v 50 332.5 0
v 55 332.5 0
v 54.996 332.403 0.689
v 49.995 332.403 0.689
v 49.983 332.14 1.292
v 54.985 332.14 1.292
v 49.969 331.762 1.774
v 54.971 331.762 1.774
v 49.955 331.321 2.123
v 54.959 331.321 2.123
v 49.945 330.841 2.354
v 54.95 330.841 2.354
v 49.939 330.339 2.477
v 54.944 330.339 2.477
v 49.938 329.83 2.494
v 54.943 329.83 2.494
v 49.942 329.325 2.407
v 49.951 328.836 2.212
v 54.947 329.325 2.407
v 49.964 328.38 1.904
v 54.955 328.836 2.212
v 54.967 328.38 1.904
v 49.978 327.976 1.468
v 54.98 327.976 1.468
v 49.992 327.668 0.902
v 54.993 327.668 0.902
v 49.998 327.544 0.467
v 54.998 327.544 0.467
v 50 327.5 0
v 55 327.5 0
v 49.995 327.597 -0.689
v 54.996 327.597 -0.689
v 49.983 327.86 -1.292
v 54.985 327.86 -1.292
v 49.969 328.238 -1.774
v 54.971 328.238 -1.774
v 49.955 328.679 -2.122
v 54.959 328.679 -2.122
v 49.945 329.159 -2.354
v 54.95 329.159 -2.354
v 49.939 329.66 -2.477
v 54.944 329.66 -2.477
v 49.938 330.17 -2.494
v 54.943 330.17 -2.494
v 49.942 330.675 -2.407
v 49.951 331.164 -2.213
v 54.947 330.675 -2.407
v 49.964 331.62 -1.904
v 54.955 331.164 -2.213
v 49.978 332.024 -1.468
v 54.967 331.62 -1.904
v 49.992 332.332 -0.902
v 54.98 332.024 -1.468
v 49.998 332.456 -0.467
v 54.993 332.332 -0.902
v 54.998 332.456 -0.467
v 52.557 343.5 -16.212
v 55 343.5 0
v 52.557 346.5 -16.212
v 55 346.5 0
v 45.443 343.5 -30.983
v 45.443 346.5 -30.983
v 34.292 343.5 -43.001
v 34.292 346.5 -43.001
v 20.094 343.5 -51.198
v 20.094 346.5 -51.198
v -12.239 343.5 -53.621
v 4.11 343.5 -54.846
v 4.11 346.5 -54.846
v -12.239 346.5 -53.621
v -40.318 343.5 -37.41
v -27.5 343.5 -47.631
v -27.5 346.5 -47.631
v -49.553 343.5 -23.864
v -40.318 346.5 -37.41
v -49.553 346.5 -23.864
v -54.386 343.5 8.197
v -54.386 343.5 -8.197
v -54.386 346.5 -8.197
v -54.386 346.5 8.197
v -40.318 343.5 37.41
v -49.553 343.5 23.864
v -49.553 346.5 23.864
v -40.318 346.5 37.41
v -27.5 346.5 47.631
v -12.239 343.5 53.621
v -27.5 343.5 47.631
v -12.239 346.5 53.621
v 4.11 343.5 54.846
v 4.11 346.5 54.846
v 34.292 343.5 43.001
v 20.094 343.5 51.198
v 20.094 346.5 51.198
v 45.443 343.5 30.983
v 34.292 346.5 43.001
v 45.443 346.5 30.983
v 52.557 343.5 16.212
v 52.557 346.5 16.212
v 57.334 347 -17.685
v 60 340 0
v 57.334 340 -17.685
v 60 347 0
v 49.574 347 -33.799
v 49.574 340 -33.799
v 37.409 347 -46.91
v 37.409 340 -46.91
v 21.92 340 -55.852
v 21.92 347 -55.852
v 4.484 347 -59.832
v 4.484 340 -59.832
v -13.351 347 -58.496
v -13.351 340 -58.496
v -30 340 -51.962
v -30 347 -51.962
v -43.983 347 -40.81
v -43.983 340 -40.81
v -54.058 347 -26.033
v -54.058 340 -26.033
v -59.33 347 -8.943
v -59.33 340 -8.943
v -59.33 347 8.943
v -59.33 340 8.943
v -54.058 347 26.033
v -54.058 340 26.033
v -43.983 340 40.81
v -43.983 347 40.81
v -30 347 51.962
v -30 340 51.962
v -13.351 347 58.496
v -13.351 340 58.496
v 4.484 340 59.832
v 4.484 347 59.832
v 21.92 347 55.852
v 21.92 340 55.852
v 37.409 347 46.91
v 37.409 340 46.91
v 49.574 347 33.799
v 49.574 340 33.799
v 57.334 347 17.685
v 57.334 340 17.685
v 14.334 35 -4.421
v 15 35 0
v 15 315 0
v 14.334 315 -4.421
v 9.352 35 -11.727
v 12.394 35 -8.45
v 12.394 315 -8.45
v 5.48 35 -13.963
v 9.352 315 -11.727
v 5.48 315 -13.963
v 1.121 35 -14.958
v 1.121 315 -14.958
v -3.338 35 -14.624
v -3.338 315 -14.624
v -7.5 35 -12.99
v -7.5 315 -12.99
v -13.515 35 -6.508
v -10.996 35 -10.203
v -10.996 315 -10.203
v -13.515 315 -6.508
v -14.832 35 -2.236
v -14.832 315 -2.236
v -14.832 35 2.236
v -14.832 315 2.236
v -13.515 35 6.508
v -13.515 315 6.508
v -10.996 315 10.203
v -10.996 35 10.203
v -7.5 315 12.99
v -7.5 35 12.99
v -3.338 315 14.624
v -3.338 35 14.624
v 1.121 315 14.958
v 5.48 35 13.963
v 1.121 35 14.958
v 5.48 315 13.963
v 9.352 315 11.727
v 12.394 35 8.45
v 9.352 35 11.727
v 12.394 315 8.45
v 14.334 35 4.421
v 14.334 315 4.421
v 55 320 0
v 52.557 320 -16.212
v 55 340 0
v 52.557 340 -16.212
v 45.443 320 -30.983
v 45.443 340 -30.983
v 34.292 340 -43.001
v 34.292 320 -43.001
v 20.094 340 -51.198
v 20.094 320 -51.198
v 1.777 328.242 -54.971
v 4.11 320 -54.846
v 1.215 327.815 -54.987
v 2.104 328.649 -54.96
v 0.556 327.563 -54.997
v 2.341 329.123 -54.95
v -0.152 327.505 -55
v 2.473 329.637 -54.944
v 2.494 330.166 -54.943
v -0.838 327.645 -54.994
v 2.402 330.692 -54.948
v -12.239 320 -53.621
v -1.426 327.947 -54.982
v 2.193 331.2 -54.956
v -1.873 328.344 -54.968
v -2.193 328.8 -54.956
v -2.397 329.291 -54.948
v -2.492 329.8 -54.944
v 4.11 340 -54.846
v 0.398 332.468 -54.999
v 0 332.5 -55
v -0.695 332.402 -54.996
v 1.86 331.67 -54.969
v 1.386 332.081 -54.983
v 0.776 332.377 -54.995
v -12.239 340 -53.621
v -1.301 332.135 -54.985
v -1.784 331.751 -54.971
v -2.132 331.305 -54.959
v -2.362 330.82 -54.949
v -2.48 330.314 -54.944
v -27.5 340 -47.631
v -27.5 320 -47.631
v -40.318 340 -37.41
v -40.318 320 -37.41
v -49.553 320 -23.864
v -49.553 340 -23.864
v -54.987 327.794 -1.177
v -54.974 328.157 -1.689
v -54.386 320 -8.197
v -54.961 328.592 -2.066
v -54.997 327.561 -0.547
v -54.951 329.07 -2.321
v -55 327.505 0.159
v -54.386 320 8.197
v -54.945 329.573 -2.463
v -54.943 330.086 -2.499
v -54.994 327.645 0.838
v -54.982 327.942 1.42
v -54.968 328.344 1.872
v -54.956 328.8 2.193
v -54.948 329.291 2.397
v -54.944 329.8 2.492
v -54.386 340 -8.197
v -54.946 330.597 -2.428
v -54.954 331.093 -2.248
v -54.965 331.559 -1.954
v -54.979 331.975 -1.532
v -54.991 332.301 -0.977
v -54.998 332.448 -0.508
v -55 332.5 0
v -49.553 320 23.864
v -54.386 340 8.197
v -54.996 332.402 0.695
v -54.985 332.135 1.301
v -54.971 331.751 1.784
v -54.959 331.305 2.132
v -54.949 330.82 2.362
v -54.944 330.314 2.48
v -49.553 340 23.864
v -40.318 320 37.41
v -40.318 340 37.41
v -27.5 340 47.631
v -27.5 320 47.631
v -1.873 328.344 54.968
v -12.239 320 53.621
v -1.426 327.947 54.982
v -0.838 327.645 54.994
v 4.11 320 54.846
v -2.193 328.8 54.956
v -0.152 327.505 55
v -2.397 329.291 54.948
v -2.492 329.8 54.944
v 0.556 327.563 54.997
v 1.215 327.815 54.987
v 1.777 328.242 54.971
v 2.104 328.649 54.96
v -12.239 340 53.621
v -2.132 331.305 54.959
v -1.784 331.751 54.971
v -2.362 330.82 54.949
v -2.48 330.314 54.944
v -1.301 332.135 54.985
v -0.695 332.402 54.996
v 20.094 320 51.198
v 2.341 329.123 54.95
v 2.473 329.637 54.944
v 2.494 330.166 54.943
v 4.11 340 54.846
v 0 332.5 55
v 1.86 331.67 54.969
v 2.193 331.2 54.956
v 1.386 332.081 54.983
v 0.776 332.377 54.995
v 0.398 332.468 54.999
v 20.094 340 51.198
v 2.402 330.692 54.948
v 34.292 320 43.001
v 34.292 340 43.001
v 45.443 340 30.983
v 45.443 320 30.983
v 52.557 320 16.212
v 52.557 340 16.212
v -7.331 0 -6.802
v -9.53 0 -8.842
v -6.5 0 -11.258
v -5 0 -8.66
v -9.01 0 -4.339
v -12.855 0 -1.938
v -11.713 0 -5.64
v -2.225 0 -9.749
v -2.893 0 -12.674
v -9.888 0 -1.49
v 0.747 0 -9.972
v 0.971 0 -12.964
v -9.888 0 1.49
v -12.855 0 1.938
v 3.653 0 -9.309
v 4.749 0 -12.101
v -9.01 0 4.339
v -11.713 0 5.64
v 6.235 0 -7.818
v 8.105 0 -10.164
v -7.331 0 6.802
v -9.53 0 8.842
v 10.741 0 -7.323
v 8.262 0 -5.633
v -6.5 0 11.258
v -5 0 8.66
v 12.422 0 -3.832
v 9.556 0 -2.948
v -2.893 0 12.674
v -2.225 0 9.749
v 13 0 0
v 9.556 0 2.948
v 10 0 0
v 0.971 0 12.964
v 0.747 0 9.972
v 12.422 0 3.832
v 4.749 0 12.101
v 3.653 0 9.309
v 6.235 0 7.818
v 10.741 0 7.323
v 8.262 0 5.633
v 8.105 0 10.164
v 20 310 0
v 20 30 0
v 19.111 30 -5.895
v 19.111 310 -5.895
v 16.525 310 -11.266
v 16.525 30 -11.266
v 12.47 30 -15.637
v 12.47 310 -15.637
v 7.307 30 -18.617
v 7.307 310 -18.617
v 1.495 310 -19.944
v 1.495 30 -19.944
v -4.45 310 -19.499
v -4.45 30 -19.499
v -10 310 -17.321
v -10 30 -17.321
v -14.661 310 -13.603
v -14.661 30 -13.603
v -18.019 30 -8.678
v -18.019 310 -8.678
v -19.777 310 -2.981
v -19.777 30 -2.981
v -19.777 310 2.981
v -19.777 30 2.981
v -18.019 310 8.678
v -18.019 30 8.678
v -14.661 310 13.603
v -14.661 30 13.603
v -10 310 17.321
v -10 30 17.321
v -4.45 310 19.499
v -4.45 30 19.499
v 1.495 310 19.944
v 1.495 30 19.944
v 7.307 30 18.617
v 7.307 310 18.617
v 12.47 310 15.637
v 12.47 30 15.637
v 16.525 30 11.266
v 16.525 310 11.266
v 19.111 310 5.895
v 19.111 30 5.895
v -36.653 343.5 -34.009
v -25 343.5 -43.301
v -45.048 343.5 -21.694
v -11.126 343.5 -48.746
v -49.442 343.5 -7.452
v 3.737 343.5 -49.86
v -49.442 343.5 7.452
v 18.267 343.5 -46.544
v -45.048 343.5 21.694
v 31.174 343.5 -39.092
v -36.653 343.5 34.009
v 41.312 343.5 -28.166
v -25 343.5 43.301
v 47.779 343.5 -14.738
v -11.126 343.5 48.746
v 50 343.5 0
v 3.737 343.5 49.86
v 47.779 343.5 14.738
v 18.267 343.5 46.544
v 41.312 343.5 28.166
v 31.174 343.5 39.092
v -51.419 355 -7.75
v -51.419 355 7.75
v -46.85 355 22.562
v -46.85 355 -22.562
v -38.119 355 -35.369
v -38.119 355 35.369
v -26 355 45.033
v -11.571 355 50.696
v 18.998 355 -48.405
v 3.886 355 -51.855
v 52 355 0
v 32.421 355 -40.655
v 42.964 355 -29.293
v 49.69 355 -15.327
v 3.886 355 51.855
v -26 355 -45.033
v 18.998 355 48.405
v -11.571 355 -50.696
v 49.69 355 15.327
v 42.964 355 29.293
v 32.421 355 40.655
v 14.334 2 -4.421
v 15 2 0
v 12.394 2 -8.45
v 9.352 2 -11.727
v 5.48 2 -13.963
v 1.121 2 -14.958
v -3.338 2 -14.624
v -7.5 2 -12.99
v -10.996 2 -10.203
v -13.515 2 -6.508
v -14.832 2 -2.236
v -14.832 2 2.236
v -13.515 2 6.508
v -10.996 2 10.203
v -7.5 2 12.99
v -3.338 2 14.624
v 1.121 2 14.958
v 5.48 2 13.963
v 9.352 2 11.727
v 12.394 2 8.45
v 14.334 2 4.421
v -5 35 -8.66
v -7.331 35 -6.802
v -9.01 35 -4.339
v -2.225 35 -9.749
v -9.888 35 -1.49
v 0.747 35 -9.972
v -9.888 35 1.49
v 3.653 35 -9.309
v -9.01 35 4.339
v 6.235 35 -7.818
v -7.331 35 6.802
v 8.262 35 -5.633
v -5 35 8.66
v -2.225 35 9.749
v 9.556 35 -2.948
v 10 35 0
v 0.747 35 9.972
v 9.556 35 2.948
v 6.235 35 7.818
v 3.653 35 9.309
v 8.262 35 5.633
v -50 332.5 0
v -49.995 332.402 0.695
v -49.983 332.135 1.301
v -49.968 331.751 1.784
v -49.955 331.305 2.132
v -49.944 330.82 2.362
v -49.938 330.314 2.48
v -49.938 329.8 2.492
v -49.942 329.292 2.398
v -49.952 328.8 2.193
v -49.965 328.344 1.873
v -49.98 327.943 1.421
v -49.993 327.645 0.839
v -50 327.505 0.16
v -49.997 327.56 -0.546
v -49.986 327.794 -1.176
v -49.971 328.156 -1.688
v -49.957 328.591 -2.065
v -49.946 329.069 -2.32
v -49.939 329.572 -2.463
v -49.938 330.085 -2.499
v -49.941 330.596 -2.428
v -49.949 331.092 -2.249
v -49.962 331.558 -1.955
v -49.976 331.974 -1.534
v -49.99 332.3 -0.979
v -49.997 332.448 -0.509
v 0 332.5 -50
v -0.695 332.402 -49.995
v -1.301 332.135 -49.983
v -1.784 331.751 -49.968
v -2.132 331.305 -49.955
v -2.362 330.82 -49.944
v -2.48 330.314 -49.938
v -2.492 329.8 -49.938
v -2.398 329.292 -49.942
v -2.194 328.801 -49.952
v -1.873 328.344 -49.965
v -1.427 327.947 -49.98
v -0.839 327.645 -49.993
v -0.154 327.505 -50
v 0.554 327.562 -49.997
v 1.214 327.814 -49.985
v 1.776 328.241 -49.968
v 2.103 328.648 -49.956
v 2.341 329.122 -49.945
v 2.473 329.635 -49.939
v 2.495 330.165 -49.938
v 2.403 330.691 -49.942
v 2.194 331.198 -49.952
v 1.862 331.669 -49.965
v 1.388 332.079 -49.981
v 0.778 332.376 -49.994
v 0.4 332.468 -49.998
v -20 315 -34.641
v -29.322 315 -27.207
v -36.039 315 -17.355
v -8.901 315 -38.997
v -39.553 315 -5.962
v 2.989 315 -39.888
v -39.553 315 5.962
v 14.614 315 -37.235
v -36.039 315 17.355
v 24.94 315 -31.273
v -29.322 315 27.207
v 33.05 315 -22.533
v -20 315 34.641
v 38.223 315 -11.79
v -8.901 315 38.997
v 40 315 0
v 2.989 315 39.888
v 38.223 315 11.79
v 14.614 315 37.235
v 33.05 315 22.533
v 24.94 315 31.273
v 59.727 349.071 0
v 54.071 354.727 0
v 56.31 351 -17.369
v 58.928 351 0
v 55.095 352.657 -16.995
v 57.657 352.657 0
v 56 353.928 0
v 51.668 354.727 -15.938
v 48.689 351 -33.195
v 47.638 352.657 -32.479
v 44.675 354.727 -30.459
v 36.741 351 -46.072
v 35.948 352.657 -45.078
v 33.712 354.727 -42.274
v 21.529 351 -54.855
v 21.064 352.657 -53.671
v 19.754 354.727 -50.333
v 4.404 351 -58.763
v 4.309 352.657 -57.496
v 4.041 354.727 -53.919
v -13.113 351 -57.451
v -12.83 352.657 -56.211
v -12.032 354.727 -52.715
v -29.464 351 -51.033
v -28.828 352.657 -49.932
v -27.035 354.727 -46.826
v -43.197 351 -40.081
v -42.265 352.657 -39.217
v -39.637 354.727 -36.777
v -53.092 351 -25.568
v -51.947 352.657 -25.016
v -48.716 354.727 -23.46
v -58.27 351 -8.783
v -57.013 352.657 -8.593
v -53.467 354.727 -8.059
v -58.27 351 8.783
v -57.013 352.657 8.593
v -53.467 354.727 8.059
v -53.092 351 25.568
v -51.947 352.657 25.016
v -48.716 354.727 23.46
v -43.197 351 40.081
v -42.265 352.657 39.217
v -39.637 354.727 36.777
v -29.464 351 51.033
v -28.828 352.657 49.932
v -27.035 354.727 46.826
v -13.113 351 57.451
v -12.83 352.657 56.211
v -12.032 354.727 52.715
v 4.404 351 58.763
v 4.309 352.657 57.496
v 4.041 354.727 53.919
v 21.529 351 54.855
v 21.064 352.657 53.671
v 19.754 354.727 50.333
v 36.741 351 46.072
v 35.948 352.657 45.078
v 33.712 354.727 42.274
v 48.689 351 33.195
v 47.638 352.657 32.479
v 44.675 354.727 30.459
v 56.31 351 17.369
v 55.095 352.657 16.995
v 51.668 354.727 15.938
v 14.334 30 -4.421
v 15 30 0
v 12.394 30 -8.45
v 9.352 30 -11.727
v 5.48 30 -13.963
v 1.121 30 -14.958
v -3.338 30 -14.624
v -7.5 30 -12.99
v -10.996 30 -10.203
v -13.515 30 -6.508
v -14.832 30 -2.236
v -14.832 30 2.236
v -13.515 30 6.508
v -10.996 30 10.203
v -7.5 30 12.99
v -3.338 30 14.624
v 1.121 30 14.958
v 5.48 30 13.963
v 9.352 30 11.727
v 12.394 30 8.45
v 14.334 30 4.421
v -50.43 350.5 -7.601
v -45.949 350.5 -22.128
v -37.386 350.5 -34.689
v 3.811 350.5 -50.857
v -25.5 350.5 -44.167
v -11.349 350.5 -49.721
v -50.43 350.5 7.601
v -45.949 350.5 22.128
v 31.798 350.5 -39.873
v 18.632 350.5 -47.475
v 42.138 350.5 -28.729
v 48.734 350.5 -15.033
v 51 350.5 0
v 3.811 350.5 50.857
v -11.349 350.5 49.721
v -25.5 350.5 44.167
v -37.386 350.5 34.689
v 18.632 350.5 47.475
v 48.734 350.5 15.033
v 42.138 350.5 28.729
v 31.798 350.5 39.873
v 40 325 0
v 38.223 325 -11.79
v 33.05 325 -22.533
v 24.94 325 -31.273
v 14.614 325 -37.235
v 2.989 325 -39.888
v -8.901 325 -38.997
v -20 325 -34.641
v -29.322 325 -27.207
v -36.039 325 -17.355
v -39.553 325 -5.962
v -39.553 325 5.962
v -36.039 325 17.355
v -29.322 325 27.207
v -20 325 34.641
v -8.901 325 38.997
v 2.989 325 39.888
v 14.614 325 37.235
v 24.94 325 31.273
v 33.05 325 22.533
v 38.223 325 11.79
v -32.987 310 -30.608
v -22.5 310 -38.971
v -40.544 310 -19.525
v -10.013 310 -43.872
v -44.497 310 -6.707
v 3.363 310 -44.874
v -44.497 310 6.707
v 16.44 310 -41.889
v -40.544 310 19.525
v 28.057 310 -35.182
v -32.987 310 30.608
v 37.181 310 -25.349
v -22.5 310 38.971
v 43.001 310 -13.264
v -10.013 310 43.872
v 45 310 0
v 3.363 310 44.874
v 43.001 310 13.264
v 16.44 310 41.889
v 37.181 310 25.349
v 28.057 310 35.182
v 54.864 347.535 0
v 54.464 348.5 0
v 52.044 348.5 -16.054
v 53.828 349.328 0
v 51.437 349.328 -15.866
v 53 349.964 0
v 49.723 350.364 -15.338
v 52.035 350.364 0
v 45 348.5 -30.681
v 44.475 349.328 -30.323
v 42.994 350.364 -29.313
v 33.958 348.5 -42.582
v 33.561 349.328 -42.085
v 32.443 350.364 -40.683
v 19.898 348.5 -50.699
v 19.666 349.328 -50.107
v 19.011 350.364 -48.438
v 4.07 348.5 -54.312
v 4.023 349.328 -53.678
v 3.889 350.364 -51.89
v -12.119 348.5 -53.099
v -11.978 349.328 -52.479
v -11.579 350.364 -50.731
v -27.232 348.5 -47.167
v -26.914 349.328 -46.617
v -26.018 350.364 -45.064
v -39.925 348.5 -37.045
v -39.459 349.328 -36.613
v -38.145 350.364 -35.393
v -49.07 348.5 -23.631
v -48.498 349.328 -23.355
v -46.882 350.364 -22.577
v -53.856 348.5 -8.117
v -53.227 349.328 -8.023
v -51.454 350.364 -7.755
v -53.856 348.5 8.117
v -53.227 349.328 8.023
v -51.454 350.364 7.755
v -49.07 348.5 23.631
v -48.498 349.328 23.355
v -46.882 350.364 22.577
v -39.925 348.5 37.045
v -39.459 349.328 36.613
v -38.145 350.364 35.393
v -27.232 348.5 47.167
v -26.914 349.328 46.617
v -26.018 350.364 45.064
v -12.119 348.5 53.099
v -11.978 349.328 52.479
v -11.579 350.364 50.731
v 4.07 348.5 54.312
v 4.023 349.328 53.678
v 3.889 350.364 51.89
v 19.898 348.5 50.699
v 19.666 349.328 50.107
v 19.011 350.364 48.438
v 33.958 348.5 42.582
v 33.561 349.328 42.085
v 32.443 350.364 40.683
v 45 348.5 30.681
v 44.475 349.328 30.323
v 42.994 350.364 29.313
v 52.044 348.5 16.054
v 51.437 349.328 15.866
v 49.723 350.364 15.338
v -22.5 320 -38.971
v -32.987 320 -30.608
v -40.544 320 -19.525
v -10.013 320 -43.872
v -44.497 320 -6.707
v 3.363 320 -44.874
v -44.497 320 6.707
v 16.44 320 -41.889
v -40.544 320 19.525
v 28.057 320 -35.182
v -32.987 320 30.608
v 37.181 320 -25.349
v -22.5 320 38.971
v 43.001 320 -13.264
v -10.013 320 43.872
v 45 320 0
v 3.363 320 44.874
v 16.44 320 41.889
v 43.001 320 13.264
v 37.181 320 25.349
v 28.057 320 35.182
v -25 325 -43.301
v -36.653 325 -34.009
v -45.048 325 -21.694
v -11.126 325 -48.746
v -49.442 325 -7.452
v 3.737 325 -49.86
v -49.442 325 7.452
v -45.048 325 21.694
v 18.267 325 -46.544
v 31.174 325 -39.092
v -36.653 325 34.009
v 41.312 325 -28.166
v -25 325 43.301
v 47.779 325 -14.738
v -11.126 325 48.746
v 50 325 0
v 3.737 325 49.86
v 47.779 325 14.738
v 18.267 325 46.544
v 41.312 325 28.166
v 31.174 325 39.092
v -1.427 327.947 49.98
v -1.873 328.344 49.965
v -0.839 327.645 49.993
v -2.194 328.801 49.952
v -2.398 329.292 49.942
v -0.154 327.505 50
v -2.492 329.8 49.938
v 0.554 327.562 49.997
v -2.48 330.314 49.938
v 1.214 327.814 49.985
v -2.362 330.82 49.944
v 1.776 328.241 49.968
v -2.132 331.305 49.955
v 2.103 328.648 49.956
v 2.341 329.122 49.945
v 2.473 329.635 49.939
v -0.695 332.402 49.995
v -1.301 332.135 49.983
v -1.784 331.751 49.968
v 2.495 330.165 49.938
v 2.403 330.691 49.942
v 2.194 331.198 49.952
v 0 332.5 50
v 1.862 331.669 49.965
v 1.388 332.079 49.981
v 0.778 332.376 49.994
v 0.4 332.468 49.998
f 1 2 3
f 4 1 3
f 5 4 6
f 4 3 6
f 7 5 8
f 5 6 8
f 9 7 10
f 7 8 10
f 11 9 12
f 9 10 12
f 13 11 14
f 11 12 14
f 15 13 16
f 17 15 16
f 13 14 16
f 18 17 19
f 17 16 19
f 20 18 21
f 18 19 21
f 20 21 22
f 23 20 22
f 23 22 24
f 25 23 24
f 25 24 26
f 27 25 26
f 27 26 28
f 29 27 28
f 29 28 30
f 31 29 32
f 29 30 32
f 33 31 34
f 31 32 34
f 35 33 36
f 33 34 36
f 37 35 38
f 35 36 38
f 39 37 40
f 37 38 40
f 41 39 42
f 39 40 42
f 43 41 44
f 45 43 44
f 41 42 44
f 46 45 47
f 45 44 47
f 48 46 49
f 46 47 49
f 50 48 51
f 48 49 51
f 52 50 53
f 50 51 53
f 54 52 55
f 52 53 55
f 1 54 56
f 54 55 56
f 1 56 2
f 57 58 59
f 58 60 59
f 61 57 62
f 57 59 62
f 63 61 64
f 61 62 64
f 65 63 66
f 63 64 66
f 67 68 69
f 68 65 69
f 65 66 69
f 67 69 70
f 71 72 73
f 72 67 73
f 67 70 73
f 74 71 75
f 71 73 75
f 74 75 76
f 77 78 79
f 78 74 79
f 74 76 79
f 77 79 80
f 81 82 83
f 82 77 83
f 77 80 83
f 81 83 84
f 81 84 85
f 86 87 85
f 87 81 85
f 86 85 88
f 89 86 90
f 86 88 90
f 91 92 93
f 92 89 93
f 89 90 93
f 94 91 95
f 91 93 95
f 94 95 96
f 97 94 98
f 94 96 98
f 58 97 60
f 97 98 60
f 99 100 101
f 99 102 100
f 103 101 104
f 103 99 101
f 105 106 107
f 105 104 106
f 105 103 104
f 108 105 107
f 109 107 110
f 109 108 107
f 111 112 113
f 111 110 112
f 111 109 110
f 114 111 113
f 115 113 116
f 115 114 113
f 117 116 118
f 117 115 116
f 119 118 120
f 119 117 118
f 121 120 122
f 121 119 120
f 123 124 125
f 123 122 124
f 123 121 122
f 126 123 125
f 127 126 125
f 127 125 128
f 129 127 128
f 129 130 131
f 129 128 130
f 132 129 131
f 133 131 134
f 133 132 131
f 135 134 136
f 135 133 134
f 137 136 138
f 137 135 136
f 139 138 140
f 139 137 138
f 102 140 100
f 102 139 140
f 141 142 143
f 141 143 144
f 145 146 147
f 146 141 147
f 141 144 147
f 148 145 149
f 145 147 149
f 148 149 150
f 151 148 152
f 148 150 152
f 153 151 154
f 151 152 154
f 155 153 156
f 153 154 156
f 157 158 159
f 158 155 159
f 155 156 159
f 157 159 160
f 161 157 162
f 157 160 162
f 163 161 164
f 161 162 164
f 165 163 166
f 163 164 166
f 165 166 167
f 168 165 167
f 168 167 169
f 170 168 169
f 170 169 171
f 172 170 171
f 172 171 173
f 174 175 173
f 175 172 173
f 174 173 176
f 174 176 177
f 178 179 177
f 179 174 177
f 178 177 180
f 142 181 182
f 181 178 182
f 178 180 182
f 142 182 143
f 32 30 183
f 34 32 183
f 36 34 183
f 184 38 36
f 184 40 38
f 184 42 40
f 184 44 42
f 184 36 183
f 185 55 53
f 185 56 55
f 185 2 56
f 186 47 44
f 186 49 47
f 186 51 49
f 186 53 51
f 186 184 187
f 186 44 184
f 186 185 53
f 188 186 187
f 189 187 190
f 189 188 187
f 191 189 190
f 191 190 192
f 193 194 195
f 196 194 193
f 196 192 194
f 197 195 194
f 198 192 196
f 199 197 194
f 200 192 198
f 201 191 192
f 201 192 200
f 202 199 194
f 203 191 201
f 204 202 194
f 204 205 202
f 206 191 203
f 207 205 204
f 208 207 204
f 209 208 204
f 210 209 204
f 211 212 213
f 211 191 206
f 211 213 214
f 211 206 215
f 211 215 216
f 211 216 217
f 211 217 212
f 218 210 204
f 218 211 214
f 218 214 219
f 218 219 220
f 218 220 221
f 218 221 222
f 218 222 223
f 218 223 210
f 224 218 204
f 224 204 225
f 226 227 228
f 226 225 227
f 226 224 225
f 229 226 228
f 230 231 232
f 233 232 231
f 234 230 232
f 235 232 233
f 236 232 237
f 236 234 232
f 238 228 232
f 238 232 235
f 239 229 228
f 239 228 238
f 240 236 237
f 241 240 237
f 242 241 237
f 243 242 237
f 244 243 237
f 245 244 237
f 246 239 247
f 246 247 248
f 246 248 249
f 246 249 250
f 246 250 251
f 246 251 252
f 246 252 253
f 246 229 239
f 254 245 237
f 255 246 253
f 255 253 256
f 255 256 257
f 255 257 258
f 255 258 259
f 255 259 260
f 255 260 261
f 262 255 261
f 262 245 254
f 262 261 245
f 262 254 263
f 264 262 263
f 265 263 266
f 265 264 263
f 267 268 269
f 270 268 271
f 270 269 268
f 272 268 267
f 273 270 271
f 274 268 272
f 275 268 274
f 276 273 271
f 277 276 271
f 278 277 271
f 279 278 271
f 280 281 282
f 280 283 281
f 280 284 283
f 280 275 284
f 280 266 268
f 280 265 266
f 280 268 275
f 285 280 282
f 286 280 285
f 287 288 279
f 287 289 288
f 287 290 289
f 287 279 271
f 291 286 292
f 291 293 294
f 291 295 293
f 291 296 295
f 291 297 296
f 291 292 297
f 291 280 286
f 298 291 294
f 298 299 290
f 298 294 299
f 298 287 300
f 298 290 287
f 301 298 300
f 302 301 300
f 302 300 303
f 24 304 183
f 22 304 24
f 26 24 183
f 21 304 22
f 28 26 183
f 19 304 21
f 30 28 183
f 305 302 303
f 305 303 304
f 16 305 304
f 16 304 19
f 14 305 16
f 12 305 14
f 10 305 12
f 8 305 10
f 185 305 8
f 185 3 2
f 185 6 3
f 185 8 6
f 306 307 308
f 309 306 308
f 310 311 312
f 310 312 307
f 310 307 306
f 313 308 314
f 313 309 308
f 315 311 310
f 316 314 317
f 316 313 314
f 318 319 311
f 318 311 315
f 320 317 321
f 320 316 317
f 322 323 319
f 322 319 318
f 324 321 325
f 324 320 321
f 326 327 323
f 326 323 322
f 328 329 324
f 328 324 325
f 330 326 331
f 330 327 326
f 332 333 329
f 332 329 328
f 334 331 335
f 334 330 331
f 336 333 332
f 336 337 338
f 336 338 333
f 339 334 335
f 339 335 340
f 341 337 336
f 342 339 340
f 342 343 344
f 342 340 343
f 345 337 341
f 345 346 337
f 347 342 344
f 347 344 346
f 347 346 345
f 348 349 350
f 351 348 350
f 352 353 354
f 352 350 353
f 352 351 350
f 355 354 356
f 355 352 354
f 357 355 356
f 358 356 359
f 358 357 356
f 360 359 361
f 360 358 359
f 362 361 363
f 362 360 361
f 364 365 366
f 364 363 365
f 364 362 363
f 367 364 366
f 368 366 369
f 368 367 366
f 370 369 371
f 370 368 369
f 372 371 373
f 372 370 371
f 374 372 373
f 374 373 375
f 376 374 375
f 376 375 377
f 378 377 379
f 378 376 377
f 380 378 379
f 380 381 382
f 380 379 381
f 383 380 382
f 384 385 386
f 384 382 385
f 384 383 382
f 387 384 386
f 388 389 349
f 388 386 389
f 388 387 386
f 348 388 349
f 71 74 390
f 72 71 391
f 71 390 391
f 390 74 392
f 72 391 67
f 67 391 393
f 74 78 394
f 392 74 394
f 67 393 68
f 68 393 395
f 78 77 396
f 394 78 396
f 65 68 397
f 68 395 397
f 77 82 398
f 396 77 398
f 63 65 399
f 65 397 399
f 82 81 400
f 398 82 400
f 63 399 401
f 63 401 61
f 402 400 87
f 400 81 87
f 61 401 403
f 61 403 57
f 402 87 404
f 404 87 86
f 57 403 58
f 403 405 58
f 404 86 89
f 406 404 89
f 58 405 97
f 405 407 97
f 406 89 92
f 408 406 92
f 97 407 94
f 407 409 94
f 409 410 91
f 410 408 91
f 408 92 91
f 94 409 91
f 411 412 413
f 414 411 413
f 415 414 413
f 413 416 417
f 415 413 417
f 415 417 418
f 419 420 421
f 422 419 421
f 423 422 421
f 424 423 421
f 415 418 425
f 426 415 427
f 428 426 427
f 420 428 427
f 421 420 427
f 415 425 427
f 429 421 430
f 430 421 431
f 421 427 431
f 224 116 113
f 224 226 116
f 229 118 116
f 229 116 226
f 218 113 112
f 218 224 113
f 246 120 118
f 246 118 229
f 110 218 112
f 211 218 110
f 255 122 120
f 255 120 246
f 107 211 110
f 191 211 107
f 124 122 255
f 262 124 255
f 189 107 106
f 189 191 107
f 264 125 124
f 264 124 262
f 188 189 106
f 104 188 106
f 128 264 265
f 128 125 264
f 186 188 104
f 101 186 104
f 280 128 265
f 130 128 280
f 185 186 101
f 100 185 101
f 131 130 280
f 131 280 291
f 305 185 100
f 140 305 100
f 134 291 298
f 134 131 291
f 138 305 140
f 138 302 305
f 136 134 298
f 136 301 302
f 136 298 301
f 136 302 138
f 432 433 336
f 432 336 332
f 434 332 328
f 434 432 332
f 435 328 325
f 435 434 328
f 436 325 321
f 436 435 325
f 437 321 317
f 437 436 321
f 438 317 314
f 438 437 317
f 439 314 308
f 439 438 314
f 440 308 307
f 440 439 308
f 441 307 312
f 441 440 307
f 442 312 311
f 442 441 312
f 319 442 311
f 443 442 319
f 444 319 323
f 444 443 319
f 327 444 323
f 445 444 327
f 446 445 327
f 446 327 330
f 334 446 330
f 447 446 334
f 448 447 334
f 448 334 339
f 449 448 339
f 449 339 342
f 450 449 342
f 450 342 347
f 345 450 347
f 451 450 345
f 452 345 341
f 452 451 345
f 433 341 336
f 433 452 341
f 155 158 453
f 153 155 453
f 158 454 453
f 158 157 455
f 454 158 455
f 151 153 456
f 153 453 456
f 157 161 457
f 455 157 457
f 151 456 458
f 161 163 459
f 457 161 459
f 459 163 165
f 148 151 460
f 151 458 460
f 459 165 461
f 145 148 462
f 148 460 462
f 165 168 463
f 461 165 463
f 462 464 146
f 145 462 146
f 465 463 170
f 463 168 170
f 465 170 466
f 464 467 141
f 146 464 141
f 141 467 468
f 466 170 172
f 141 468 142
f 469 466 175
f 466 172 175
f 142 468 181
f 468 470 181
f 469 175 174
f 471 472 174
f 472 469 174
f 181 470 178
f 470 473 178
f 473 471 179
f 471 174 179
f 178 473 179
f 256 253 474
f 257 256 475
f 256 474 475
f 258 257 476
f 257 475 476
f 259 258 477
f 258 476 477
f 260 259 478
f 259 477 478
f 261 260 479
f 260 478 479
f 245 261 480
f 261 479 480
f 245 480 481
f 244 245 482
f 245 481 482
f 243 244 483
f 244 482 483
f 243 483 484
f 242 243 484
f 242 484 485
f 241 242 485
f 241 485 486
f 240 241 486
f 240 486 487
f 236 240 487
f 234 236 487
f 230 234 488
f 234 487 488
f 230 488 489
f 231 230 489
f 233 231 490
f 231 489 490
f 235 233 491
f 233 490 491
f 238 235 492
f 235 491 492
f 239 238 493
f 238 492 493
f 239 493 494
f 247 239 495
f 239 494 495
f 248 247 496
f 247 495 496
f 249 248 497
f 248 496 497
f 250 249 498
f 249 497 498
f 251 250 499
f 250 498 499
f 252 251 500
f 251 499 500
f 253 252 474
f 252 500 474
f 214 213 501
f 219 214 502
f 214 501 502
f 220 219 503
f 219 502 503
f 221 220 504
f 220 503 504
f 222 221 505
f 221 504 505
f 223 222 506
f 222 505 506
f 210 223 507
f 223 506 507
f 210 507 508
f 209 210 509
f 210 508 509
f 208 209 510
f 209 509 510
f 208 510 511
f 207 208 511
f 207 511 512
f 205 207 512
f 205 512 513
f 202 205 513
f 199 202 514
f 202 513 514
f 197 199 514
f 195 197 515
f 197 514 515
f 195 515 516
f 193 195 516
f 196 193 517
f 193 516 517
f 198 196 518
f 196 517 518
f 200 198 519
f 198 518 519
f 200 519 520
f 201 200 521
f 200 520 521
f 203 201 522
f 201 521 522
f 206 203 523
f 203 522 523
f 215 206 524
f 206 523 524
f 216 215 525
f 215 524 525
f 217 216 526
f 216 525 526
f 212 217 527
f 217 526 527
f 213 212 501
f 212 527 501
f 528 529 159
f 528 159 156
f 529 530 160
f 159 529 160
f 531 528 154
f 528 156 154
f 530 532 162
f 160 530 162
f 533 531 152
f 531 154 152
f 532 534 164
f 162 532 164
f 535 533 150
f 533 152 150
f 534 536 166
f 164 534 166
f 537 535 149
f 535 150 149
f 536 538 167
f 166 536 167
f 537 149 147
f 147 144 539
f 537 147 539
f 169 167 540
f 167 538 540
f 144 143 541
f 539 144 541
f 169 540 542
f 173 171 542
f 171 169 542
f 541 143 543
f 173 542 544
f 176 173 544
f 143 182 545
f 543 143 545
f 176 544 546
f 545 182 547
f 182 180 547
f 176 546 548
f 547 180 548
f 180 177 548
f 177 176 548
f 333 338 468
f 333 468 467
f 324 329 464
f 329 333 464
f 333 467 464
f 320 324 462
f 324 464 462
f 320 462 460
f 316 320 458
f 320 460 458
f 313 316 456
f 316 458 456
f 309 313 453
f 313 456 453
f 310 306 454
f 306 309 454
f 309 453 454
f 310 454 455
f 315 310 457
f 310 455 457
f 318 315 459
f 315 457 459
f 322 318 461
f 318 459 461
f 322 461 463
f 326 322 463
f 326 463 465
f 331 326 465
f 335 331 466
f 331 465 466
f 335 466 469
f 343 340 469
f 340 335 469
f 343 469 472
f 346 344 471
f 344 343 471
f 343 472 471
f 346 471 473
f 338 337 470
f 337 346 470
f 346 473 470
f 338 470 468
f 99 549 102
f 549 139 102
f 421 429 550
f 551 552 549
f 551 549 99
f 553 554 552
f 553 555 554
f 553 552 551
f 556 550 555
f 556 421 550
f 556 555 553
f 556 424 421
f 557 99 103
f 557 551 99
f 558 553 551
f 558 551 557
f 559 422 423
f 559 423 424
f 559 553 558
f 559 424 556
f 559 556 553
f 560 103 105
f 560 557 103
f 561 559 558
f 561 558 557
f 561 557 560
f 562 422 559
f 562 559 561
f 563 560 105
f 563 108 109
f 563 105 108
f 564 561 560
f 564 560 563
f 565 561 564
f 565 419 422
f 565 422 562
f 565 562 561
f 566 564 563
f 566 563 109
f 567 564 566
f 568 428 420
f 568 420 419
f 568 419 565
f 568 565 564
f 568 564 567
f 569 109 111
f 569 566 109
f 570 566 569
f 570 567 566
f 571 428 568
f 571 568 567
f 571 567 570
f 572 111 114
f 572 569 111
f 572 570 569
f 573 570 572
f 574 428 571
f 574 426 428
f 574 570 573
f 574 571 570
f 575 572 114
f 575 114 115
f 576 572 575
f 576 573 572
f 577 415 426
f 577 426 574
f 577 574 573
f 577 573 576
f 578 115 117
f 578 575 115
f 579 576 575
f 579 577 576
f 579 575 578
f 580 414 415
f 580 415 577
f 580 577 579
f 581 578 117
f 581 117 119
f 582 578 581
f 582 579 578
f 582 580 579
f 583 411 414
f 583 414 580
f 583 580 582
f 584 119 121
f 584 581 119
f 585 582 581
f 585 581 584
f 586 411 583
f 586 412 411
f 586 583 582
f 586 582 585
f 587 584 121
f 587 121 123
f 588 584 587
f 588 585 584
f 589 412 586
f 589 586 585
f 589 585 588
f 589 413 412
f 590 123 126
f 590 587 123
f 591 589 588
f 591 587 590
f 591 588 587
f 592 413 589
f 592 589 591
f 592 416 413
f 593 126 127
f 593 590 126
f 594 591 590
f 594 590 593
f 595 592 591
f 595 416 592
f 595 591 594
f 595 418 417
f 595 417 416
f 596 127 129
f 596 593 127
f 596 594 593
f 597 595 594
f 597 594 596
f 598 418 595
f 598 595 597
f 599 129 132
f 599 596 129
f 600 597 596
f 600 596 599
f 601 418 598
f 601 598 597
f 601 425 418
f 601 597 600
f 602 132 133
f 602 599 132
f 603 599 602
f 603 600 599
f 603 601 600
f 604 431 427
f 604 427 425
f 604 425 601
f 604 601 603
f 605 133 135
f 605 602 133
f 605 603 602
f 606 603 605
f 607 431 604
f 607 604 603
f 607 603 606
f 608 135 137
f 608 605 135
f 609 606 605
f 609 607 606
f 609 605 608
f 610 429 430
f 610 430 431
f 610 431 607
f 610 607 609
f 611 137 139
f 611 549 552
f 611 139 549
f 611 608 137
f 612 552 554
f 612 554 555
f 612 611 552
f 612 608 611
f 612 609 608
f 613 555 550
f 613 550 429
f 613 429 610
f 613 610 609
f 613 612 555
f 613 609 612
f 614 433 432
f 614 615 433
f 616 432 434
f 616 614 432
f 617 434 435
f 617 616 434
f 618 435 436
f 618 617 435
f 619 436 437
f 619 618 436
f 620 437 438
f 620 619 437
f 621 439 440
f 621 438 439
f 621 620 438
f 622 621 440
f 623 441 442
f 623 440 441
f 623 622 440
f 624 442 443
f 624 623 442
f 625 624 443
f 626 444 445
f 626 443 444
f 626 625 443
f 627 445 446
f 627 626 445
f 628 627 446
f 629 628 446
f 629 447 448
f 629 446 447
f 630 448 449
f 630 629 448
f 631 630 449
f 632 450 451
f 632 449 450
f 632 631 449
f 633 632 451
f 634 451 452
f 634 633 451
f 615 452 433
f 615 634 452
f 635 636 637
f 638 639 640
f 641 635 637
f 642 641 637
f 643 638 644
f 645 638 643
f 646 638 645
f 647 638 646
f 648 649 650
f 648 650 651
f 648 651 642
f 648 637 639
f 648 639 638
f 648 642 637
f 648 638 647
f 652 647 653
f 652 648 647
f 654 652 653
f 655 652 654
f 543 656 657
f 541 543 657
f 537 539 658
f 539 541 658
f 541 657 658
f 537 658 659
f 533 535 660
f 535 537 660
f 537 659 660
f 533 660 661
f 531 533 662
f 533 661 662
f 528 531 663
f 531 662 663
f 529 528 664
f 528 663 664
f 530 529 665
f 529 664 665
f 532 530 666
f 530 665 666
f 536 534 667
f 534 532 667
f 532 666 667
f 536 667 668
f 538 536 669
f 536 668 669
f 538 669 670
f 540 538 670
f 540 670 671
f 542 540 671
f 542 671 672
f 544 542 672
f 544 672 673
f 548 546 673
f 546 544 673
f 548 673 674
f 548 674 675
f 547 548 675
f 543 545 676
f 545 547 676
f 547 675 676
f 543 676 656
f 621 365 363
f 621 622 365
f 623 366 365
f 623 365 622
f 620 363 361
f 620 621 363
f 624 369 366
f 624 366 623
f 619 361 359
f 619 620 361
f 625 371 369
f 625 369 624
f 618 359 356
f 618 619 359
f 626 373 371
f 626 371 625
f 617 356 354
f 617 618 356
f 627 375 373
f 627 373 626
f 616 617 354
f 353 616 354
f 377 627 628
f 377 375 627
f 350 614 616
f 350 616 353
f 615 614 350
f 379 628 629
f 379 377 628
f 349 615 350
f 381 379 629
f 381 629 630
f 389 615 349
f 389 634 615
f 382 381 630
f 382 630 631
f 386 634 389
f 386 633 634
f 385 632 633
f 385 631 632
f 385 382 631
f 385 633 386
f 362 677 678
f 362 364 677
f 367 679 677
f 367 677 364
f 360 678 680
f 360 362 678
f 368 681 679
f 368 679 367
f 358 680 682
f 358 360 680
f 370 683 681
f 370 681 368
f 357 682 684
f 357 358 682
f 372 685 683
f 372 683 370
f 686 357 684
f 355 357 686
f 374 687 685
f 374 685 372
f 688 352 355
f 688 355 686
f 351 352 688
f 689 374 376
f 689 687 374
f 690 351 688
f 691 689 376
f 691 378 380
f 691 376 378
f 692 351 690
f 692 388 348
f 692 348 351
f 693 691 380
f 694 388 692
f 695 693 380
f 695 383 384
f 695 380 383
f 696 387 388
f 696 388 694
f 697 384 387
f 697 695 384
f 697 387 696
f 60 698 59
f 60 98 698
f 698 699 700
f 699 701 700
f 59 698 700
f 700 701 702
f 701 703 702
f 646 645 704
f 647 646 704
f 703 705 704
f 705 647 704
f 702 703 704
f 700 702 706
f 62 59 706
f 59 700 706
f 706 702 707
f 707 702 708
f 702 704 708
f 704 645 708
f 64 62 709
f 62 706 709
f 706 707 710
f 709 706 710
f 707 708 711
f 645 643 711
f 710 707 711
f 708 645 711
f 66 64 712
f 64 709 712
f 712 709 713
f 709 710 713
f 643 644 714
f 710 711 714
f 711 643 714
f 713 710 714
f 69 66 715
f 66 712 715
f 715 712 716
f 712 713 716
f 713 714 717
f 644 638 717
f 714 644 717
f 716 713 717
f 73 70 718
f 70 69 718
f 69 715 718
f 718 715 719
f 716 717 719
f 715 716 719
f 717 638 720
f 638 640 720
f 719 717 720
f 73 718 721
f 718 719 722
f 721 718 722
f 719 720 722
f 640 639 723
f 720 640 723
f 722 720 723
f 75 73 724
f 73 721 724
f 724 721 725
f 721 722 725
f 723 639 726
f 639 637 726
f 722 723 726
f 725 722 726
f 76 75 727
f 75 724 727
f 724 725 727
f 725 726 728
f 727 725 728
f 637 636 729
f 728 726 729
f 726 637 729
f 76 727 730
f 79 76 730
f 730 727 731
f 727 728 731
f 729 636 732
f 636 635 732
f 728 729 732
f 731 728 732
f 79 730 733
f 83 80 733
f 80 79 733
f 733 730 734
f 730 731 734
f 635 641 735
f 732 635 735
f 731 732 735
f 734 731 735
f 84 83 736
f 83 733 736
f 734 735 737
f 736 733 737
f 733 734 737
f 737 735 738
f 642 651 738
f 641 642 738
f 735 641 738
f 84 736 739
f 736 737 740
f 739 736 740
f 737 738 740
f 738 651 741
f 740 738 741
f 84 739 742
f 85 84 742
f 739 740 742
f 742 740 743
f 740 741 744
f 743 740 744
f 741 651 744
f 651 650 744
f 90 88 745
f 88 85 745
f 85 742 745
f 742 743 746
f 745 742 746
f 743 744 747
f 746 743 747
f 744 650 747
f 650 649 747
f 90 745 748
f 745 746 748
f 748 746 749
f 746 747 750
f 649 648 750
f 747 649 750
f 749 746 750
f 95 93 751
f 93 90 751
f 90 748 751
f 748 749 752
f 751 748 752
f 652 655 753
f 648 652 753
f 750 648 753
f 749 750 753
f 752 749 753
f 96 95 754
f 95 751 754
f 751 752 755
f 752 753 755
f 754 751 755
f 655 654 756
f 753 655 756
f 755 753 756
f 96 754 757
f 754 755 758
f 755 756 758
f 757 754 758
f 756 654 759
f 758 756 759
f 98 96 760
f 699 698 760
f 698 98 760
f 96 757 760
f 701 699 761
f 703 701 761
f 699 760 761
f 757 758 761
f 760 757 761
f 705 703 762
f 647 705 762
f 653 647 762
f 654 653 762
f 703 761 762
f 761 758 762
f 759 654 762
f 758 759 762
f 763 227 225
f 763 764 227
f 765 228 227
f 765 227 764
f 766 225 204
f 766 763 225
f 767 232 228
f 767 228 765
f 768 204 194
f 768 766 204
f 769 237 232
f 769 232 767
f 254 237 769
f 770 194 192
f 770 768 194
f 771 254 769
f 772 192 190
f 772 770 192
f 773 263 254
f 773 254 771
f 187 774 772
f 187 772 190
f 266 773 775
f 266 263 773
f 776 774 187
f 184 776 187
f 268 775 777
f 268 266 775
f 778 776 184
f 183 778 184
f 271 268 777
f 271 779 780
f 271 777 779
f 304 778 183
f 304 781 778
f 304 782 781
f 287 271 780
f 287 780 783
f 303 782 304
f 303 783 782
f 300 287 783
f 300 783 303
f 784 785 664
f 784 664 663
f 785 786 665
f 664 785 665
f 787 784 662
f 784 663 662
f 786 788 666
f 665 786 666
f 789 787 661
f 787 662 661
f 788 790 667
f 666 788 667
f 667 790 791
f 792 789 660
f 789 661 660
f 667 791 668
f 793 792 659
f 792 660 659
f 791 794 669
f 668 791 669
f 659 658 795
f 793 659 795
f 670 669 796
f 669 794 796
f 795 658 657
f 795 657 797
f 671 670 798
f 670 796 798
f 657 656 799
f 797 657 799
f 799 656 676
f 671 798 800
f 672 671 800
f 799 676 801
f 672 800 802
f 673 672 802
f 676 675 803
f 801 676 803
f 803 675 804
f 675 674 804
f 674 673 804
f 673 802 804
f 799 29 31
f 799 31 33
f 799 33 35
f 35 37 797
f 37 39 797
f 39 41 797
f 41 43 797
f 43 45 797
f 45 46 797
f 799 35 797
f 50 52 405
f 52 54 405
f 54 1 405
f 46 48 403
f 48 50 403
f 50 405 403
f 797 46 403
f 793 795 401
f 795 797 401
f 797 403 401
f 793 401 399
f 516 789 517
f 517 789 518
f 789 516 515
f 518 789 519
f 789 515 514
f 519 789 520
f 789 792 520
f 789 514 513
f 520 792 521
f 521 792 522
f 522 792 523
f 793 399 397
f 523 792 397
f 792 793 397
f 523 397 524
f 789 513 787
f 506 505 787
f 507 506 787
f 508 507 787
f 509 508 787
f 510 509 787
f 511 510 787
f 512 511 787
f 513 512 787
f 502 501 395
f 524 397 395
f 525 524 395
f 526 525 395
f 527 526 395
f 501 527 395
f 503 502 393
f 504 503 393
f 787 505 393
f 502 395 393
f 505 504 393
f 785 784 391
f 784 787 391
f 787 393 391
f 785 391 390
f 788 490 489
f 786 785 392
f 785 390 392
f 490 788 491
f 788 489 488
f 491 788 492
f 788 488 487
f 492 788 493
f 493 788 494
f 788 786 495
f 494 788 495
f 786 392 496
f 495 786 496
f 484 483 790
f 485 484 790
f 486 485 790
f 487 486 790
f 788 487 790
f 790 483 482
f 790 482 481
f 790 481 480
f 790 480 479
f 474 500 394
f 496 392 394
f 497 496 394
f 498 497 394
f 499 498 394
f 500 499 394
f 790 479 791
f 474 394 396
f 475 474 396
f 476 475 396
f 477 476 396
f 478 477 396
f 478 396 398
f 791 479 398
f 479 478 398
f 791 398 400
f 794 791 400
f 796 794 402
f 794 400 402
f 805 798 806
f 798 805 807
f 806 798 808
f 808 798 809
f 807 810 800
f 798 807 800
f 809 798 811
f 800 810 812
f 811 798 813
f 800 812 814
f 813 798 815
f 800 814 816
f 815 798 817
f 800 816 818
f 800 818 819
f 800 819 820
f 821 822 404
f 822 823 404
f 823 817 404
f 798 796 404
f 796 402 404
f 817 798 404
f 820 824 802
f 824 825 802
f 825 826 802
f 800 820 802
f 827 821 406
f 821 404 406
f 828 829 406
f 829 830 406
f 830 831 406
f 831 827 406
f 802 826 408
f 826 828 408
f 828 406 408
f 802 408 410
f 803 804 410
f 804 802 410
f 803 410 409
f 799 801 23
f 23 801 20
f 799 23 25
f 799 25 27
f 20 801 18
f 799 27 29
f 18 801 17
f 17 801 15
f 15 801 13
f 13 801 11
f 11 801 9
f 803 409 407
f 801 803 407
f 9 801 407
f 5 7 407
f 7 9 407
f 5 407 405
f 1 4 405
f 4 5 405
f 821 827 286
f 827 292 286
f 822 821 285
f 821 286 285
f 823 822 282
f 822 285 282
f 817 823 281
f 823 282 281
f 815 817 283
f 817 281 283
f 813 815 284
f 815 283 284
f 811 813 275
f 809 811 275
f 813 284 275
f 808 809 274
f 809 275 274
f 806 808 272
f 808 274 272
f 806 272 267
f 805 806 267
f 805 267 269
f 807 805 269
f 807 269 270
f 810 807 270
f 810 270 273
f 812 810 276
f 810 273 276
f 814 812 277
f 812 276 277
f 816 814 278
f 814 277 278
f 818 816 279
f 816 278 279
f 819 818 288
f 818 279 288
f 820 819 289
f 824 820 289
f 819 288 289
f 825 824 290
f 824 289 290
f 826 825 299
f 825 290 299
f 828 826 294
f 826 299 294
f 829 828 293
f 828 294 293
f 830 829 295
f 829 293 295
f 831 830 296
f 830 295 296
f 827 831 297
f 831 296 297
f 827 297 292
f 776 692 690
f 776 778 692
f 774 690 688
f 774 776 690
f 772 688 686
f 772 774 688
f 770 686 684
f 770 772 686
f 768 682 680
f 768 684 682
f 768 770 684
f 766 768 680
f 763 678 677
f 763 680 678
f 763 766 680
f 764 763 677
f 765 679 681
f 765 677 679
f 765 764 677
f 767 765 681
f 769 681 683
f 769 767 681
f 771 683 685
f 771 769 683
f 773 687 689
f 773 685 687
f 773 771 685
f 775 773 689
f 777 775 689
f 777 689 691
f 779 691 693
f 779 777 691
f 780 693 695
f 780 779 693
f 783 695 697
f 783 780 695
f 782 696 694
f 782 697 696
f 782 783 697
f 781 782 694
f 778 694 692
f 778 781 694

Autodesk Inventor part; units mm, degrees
ref_plane "YZ Plane" through (0, 0, 0) normal (1, 0, 0) x (0, 1, 0)
ref_plane "XZ Plane" through (0, 0, 0) normal (0, 1, 0) x (-1, 0, 0)
ref_plane "XY Plane" through (0, 0, 0) normal (0, 0, 1) x (1, 0, 0)
sketch "Эскиз1" plane through (0, 0, 0) normal (0, 0, 1) x (1, 0, 0)
  line L0 (0, 0) -> (15, 0)
  line L1 (15, 0) -> (15, 30)
  line L2 (15, 30) -> (20, 30)
  line L3 (20, 30) -> (20, 310)
  line L4 (20, 310) -> (45, 310)
  line L5 (45, 310) -> (45, 320)
  line L6 (45, 320) -> (55, 320)
  line L7 (55, 320) -> (55, 340)
  line L8 (55, 340) -> (60, 340)
  line L9 (60, 340) -> (60, 347)
  line L10 (52, 355) -> (0, 355)
  arc A0 (60, 347) -> (52, 355) centre (52, 347) ccw
  line L11 (15, 0) -> (10, 0)
  line L12 (10, 0) -> (10, 35)
  line L13 (10, 35) -> (15, 35)
  line L14 (15, 35) -> (15, 315)
  line L15 (15, 315) -> (40, 315)
  line L16 (40, 315) -> (40, 325)
  line L17 (40, 325) -> (50, 325)
  line L18 (50, 325) -> (50, 343.5)
  line L19 (50, 343.5) -> (55, 343.5)
  line L20 (55, 343.5) -> (55, 346.5)
  line L21 (51, 350.5) -> (0, 350.5)
  arc A1 (55, 346.5) -> (51, 350.5) centre (51, 346.5) ccw
  line L22 (0, 355) -> (0, 350.5)
  point P0 (60, 355)
  dimension "d0" = 15
  dimension "d1" = 30
  dimension "d2" = 5
  dimension "d3" = 280
  dimension "d4" = 25
  dimension "d5" = 10
  dimension "d6" = 10
  dimension "d7" = 20
  dimension "d8" = 5
  dimension "d9" = 15
  dimension "d10" = 8
  dimension "d11" = 5
  dimension "d12" = 35
  dimension "d13" = 25
  dimension "d14" = 10
  dimension "d15" = 10
  dimension "d16" = 18.5
  dimension "d17" = 4
  dimension "d18" = 3
revolve "Вращение1" add sketch "Эскиз1" angle 360 about axis through (0, 355, 0) along (0, -1, 0)
sketch "Эскиз2" plane through (0, 0, 0) normal (1, 0, 0) x (0, 1, 0)
  line L0 (340, 55) -> (340, -55) projected
  line L1 (320, 55) -> (320, -55) projected
  circle A0 centre (330, 0) radius 2.5
  point P0 (0, 0)
  dimension "d20" = 5
extrude "Выдавливание1" cut sketch "Эскиз2" against normal through all both and the other way through all
pattern_circular "Круговой массив1" count 4 over 360 about axis through (0, 330, 0) along (0, -1, 0) of "Выдавливание1"
thread "Резьба1" size "M30x3.5" class "6g" standard "ANSI Metric M Profile" full length
chamfer "Фаска1" distance 2 angle 45 1 edges at (-15, 0, 0)
properties part number "Сапун" material "Чугун, серый"
